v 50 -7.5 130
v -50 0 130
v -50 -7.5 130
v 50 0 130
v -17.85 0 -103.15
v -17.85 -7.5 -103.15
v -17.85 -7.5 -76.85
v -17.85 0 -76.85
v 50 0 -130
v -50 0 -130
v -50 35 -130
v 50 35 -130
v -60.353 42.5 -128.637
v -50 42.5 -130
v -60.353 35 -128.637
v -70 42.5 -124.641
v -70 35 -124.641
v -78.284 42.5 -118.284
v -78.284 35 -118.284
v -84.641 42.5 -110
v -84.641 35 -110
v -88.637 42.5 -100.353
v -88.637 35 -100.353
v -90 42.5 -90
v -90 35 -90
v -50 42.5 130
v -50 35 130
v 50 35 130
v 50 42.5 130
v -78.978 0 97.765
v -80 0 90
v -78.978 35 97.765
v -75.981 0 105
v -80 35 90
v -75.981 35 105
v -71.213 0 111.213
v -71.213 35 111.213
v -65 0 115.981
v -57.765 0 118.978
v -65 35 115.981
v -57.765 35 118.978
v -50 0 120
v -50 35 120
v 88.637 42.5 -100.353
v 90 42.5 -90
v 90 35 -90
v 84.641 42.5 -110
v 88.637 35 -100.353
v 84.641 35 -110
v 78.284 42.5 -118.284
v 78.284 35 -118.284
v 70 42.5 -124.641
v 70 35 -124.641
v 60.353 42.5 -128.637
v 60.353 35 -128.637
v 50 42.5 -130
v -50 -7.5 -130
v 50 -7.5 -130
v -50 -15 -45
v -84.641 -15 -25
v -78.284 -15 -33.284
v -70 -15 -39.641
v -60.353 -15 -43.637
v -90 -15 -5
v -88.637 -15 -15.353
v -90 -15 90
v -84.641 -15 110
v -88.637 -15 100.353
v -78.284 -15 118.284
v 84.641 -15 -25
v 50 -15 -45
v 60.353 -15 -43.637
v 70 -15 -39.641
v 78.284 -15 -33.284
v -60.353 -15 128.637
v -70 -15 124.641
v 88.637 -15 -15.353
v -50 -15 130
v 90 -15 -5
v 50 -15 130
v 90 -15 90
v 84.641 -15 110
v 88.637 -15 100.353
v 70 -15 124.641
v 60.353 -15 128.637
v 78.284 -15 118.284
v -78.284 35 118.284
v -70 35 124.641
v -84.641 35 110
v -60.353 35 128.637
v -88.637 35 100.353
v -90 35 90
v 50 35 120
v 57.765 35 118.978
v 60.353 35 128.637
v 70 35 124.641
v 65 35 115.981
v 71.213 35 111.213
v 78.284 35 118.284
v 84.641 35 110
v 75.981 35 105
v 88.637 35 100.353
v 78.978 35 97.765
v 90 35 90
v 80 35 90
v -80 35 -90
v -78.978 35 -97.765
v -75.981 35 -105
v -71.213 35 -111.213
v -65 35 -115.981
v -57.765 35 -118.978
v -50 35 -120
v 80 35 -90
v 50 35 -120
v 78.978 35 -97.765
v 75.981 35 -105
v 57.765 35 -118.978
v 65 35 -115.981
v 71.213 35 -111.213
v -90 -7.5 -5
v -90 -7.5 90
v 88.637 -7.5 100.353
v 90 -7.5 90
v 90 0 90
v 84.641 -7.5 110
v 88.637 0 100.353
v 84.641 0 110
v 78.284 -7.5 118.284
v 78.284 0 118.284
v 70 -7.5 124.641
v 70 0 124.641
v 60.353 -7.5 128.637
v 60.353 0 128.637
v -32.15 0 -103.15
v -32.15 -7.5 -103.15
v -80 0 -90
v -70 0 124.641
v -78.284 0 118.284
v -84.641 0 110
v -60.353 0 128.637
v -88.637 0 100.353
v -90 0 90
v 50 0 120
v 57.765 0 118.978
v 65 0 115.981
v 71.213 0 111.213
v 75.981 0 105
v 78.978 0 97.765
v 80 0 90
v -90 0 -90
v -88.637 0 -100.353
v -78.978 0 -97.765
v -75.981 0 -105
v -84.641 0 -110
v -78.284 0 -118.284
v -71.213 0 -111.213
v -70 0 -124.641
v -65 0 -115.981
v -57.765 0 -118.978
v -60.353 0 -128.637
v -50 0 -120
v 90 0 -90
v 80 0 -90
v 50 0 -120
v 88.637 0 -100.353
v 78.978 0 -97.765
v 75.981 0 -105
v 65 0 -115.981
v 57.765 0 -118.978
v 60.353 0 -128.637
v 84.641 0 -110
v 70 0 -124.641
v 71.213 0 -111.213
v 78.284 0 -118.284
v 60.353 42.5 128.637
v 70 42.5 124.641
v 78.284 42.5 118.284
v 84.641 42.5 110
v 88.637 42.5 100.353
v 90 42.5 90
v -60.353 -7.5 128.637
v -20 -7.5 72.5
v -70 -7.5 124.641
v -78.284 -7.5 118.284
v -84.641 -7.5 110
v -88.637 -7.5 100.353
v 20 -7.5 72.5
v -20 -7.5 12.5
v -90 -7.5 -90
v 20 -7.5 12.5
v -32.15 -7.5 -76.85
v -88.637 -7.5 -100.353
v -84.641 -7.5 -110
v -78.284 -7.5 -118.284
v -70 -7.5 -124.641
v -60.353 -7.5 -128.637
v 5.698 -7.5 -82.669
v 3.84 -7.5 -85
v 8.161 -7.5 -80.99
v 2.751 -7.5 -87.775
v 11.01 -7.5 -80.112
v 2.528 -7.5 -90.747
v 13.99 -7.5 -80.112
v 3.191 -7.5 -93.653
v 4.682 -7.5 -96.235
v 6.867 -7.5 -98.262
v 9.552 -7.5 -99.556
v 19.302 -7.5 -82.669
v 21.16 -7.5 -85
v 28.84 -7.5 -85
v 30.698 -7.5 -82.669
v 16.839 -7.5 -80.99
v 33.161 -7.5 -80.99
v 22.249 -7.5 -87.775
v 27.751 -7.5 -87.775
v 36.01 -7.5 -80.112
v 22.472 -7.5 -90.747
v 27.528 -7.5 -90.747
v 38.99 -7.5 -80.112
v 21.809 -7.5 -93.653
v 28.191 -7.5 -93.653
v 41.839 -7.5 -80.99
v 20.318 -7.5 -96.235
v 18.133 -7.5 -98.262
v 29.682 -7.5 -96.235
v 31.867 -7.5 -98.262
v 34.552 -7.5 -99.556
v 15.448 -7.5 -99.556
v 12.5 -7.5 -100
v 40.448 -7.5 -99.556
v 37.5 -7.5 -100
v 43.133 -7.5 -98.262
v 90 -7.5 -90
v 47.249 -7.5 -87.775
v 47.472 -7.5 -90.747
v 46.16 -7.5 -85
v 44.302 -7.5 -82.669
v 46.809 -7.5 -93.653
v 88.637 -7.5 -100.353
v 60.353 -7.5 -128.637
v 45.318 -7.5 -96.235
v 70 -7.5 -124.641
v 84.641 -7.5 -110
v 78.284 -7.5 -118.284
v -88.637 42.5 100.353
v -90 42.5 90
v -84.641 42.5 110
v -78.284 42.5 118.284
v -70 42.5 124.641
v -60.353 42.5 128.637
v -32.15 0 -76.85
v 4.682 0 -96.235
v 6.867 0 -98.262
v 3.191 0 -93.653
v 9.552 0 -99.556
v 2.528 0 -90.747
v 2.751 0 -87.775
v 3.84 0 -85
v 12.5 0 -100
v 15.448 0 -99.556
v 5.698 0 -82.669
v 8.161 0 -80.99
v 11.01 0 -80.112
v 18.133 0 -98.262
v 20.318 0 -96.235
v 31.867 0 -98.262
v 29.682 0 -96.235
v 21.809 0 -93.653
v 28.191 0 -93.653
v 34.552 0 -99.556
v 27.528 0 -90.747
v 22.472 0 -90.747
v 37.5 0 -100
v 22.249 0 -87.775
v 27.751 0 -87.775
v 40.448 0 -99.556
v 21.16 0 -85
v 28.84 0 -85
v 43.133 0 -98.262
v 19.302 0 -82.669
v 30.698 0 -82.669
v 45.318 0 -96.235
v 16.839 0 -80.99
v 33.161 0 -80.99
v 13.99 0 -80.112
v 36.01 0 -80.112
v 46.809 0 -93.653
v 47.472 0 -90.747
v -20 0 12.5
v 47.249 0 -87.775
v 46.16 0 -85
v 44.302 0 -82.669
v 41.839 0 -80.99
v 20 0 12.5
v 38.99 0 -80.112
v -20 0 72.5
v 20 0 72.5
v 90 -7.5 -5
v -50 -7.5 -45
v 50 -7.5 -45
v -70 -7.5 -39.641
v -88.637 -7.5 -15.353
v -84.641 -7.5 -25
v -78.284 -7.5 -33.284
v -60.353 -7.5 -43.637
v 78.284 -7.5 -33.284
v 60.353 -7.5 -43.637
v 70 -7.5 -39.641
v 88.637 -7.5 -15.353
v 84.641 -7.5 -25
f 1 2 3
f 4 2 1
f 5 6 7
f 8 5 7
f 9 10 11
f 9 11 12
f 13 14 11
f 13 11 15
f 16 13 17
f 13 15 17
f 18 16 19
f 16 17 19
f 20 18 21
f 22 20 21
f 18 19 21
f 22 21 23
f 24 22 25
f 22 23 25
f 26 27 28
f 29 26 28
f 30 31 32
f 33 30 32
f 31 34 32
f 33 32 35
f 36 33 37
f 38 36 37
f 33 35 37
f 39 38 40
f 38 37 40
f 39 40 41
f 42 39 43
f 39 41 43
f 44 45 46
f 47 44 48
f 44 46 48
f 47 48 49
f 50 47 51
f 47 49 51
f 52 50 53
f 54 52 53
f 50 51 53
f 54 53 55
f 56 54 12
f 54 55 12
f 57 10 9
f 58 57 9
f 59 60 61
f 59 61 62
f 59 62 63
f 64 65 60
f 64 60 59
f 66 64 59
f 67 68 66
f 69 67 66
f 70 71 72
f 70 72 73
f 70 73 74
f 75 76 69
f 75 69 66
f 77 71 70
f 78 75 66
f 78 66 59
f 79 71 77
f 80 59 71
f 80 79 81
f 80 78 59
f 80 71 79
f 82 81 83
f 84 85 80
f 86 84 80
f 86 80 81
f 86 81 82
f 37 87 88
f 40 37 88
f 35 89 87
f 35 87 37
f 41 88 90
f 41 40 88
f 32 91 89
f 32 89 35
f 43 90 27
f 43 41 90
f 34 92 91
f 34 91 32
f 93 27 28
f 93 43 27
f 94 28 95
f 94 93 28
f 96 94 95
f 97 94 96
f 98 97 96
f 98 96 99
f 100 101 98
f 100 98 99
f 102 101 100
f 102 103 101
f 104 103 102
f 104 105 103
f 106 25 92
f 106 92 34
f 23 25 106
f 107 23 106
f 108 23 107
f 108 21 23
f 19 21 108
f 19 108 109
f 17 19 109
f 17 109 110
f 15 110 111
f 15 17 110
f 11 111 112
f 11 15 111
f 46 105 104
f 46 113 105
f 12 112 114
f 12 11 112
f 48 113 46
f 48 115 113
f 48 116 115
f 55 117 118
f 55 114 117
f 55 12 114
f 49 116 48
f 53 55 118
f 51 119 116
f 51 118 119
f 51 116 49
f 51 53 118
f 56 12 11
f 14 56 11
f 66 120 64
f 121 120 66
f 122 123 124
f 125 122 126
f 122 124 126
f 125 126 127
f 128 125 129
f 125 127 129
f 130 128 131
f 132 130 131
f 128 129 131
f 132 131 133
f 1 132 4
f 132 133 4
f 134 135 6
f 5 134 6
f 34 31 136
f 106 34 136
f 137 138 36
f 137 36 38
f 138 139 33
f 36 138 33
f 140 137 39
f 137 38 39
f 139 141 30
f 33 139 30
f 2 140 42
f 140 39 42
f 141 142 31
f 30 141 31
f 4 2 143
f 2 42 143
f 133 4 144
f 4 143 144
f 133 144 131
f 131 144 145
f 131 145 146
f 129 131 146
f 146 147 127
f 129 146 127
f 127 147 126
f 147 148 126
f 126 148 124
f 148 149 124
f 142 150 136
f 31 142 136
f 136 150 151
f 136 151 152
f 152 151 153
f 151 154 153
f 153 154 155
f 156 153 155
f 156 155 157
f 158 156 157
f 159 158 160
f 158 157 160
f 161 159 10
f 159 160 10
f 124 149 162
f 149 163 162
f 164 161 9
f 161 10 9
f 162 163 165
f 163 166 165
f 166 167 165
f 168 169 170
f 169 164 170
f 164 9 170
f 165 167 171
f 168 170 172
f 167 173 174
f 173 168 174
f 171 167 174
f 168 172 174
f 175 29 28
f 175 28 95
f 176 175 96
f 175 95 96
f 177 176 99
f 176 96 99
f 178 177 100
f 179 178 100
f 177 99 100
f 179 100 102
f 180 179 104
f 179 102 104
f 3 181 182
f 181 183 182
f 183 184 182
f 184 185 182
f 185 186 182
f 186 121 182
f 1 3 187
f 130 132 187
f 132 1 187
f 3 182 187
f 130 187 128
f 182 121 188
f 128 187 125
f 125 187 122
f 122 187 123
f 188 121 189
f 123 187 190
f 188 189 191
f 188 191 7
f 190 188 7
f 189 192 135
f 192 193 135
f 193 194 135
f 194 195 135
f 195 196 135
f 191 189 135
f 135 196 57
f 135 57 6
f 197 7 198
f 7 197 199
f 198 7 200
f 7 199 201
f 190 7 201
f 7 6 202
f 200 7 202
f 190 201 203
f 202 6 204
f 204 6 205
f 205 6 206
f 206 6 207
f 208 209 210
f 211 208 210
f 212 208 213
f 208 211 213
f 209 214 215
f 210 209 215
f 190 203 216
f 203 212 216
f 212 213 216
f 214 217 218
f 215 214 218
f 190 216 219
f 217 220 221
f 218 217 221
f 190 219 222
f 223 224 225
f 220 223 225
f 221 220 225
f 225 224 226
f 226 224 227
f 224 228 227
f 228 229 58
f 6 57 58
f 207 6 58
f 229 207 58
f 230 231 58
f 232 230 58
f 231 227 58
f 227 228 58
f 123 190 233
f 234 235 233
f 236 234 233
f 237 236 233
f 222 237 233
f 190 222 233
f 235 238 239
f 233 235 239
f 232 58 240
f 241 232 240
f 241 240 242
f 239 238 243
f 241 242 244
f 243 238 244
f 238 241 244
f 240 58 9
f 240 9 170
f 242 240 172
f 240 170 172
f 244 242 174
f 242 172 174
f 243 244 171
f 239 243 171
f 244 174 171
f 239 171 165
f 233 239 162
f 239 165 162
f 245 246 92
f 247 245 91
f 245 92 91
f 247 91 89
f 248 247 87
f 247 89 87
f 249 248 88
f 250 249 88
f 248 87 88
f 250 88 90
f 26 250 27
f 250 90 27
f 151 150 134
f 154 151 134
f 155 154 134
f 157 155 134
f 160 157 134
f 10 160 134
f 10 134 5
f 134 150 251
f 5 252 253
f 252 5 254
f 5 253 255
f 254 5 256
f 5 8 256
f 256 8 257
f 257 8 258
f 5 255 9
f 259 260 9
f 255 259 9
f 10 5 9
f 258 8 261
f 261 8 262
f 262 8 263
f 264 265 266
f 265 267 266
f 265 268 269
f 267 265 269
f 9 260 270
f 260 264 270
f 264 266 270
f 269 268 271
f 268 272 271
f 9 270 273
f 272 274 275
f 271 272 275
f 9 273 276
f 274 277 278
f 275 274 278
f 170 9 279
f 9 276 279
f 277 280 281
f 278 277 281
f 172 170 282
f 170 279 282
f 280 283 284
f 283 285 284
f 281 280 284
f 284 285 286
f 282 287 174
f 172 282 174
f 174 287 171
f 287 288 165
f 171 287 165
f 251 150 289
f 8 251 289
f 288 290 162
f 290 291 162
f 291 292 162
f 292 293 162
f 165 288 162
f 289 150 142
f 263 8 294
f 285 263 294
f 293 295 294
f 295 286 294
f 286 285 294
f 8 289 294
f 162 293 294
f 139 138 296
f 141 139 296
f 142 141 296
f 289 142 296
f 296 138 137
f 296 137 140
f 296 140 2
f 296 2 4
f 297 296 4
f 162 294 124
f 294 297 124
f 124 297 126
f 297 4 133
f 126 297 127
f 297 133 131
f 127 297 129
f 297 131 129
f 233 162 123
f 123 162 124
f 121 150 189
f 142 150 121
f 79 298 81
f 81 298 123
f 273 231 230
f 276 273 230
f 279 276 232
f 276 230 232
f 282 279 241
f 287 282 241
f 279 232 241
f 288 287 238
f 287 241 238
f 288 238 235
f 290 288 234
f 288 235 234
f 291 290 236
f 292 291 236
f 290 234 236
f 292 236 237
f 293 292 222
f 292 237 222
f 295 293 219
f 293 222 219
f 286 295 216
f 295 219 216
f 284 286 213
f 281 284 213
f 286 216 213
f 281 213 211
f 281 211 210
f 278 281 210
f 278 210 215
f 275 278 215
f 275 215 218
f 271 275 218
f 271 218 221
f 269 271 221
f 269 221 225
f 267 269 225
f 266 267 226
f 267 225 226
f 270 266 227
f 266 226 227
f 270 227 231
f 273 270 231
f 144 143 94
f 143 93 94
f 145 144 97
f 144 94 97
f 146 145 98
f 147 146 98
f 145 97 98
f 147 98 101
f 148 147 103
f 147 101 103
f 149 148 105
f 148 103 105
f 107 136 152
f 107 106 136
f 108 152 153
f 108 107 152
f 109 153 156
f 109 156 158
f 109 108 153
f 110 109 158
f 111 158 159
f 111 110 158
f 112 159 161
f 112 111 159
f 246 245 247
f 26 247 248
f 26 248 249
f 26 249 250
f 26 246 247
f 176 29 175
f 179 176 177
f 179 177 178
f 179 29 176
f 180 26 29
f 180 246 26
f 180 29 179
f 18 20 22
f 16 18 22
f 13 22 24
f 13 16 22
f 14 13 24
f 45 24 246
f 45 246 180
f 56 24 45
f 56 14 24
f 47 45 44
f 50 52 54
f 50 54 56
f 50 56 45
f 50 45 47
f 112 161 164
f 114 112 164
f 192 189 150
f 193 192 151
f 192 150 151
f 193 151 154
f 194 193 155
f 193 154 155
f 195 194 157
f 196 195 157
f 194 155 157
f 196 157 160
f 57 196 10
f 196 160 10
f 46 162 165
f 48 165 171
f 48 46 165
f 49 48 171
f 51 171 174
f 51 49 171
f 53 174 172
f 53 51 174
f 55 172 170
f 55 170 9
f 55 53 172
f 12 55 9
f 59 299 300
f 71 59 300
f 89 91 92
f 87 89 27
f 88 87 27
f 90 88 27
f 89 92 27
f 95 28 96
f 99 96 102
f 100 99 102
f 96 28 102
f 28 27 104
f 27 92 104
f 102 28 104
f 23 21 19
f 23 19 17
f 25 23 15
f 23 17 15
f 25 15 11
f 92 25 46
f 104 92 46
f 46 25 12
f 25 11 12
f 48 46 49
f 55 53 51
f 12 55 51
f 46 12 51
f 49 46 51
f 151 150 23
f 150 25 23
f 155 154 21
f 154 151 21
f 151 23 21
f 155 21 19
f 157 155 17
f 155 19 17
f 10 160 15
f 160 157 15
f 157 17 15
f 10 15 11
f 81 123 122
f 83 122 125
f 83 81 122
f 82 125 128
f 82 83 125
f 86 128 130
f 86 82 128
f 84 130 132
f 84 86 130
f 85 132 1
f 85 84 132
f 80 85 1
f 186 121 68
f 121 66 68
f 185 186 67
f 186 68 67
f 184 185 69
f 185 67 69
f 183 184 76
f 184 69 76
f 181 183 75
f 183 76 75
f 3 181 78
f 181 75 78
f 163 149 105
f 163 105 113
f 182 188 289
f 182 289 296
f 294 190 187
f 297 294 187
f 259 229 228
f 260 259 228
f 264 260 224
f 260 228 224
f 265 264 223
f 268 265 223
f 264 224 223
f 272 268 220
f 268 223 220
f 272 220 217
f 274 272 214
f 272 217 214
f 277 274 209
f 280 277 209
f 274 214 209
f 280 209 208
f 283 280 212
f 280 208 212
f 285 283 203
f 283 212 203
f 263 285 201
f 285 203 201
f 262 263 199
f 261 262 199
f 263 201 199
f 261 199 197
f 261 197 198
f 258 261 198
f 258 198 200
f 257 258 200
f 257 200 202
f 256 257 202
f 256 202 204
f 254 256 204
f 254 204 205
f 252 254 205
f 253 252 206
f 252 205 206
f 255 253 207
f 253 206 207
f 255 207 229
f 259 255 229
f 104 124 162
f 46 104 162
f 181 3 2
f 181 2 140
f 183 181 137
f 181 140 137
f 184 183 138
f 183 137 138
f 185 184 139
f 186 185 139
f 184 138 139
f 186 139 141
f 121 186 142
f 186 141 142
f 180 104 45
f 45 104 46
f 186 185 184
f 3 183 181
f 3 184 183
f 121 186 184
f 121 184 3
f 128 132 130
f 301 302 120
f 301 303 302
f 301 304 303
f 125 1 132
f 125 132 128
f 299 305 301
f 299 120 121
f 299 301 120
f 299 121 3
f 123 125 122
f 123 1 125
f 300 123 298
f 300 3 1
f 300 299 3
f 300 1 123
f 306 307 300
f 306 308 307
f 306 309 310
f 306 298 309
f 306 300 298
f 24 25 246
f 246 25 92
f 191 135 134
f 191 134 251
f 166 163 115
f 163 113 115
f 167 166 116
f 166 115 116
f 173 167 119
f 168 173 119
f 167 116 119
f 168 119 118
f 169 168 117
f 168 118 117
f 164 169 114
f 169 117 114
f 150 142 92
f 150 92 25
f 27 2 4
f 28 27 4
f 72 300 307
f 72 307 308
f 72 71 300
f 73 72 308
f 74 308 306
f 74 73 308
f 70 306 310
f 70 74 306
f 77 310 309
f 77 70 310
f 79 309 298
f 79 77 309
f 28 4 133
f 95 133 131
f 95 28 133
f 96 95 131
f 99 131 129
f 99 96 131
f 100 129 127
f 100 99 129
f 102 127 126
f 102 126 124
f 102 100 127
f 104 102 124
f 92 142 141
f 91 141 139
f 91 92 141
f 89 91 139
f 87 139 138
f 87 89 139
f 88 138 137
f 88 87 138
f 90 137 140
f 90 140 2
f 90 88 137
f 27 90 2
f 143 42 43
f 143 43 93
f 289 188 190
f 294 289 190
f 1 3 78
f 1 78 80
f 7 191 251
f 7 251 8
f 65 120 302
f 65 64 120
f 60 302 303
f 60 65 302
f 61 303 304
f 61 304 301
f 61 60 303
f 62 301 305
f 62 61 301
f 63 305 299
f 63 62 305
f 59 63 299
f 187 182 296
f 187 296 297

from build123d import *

# Parameters (mm, degrees)
SKETCH1_W           = 160
SKETCH1_H           = 240
BOSS_EXTRUDE1_DEPTH = 35
FILLET1_R           = 30
SHELL2_T            = 10
BOSS_EXTRUDE3_DEPTH = 7.5
BOSS_EXTRUDE4_DEPTH = 7.5
SKETCH6_W           = 180
SKETCH6_H           = 175
BOSS_EXTRUDE5_DEPTH = 7.5
FILLET2_R           = 40
SKETCH9_W           = 40
SKETCH9_H           = 60
CUT_EXTRUDE1_DEPTH  = 15
SKETCH10_W          = 40
SKETCH10_H          = 60
BOSS_EXTRUDE6_DEPTH = 7.5
SKETCH11_W          = 14.3
SKETCH11_H          = 26.3
CUT_EXTRUDE2_DEPTH  = 7.5
SKETCH12_R          = 10
CUT_EXTRUDE4_DEPTH  = 7.5


# Read off the part's stored shape, not the designer's step: Split2
with BuildPart() as part:
    # Sketch1 → Boss-Extrude1 (new body)
    with BuildSketch(Plane(origin=(0, 0, 0), x_dir=(1, 0, 0), z_dir=(0, 1, 0))):
        Rectangle(SKETCH1_W, SKETCH1_H)
    extrude(amount=BOSS_EXTRUDE1_DEPTH)

    # Fillet1
    fillet1_edges = [part.edges().sort_by_distance(p)[0] for p in [
        (-80, 17.5, 120),
        (-80, 17.5, -120),
        (80, 17.5, -120),
        (80, 17.5, 120),
    ]]
    fillet(fillet1_edges, radius=FILLET1_R)

    # Shell2
    shell2_openings = [part.faces().sort_by_distance(p)[0] for p in [
        (0, 0, 0),
        (0, 35, 0),
    ]]
    offset(amount=SHELL2_T, openings=shell2_openings, kind=Kind.INTERSECTION)


with BuildPart() as body_2:
    # Sketch2 → Boss-Extrude3 (new body)
    with BuildSketch(Plane.XZ):
        with BuildLine():
            Line((90, -90), (90, 90))
            ThreePointArc((90, 90), (78.284271247, 118.284271247), (50, 130))
            Line((50, 130), (-50, 130))
            ThreePointArc((-50, 130), (-78.284271247, 118.284271247), (-90, 90))
            Line((-90, 90), (-90, -90))
            ThreePointArc((-90, -90), (-78.284271247, -118.284271247), (-50, -130))
            Line((-50, -130), (50, -130))
            ThreePointArc((50, -130), (78.284271247, -118.284271247), (90, -90))
        make_face()
    extrude(amount=BOSS_EXTRUDE3_DEPTH)


with BuildPart() as body_3:
    # Sketch3 → Boss-Extrude4 (new body)
    with BuildSketch(Plane(origin=(0, 35, 0), x_dir=(1, 0, 0), z_dir=(0, 1, 0))):
        with BuildLine():
            Line((-50, -130), (50, -130))
            ThreePointArc((50, -130), (78.284271247, -118.284271247), (90, -90))
            Line((90, -90), (90, 90))
            ThreePointArc((90, 90), (78.284271247, 118.284271247), (50, 130))
            Line((50, 130), (-50, 130))
            ThreePointArc((-50, 130), (-78.284271247, 118.284271247), (-90, 90))
            Line((-90, 90), (-90, -90))
            ThreePointArc((-90, -90), (-78.284271247, -118.284271247), (-50, -130))
        make_face()
    extrude(amount=BOSS_EXTRUDE4_DEPTH)


with BuildPart() as body_4:
    # Sketch6 → Boss-Extrude5 (new body)
    with BuildSketch(Plane.XZ.offset(7.5)):
        with Locations((0, 42.5)):
            Rectangle(SKETCH6_W, SKETCH6_H)
    extrude(amount=BOSS_EXTRUDE5_DEPTH)

    # Fillet2
    fillet2_edges = [body_4.edges().sort_by_distance(p)[0] for p in [
        (-90, -11.25, 130),
        (90, -11.25, 130),
        (90, -11.25, -45),
        (-90, -11.25, -45),
    ]]
    fillet(fillet2_edges, radius=FILLET2_R)


with BuildPart() as cut_extrude1_tool:
    # Sketch9 → Cut-Extrude1 (new body)
    with BuildSketch(Plane.XZ.offset(15)):
        with Locations((0, 42.5)):
            Rectangle(SKETCH9_W, SKETCH9_H)
    extrude(amount=-CUT_EXTRUDE1_DEPTH)


with BuildPart() as body_2_1:
    add(body_2.part)

    # Cut-Extrude1: cut by cut_extrude1_tool
    add(cut_extrude1_tool.part, mode=Mode.SUBTRACT)



with BuildPart() as body_4_1:
    add(body_4.part)

    # Cut-Extrude1: cut by cut_extrude1_tool
    add(cut_extrude1_tool.part, mode=Mode.SUBTRACT)


with BuildPart() as body_2_2:
    add(body_2_1.part)

    add(body_4_1.part)  # Boss-Extrude6 merges body 4
    # Sketch10 → Boss-Extrude6 (add)
    with BuildSketch(Plane(origin=(0, -7.5, 0), x_dir=(1, 0, 0), z_dir=(0, 1, 0))):
        with Locations((0, -42.5)):
            Rectangle(SKETCH10_W, SKETCH10_H)
    extrude(amount=-BOSS_EXTRUDE6_DEPTH)

    # Sketch11 → Cut-Extrude2 (cut)
    with BuildSketch(Plane.XZ.offset(7.5)):
        with Locations((-25, -90)):
            Rectangle(SKETCH11_W, SKETCH11_H)
    extrude(amount=-CUT_EXTRUDE2_DEPTH, mode=Mode.SUBTRACT)

    # Sketch12 → Cut-Extrude4 (cut)
    with BuildSketch(Plane.XZ.offset(7.5)):
        with Locations(Location((12.5, -90, 0), (0, 0, 270))):
            Circle(SKETCH12_R)
        with Locations(Location((37.5, -90, 0), (0, 0, 270))):
            Circle(SKETCH12_R)
    extrude(amount=-CUT_EXTRUDE4_DEPTH, mode=Mode.SUBTRACT)


with BuildPart() as body_4_2:
    # Split2: the piece on the far side of the plane
    add(body_2_2.part)
    split(bisect_by=Plane(origin=(0, -7.5, 0), x_dir=(1, 0, 0), z_dir=(0, 1, 0)), keep=Keep.BOTTOM)


with BuildPart() as body_2_3:
    add(body_2_2.part)

    # Split2
    split(bisect_by=Plane(origin=(0, -7.5, 0), x_dir=(1, 0, 0), z_dir=(0, 1, 0)), keep=Keep.TOP)


solid = Compound([part.part, body_3.part, body_4_2.part, body_2_3.part])
